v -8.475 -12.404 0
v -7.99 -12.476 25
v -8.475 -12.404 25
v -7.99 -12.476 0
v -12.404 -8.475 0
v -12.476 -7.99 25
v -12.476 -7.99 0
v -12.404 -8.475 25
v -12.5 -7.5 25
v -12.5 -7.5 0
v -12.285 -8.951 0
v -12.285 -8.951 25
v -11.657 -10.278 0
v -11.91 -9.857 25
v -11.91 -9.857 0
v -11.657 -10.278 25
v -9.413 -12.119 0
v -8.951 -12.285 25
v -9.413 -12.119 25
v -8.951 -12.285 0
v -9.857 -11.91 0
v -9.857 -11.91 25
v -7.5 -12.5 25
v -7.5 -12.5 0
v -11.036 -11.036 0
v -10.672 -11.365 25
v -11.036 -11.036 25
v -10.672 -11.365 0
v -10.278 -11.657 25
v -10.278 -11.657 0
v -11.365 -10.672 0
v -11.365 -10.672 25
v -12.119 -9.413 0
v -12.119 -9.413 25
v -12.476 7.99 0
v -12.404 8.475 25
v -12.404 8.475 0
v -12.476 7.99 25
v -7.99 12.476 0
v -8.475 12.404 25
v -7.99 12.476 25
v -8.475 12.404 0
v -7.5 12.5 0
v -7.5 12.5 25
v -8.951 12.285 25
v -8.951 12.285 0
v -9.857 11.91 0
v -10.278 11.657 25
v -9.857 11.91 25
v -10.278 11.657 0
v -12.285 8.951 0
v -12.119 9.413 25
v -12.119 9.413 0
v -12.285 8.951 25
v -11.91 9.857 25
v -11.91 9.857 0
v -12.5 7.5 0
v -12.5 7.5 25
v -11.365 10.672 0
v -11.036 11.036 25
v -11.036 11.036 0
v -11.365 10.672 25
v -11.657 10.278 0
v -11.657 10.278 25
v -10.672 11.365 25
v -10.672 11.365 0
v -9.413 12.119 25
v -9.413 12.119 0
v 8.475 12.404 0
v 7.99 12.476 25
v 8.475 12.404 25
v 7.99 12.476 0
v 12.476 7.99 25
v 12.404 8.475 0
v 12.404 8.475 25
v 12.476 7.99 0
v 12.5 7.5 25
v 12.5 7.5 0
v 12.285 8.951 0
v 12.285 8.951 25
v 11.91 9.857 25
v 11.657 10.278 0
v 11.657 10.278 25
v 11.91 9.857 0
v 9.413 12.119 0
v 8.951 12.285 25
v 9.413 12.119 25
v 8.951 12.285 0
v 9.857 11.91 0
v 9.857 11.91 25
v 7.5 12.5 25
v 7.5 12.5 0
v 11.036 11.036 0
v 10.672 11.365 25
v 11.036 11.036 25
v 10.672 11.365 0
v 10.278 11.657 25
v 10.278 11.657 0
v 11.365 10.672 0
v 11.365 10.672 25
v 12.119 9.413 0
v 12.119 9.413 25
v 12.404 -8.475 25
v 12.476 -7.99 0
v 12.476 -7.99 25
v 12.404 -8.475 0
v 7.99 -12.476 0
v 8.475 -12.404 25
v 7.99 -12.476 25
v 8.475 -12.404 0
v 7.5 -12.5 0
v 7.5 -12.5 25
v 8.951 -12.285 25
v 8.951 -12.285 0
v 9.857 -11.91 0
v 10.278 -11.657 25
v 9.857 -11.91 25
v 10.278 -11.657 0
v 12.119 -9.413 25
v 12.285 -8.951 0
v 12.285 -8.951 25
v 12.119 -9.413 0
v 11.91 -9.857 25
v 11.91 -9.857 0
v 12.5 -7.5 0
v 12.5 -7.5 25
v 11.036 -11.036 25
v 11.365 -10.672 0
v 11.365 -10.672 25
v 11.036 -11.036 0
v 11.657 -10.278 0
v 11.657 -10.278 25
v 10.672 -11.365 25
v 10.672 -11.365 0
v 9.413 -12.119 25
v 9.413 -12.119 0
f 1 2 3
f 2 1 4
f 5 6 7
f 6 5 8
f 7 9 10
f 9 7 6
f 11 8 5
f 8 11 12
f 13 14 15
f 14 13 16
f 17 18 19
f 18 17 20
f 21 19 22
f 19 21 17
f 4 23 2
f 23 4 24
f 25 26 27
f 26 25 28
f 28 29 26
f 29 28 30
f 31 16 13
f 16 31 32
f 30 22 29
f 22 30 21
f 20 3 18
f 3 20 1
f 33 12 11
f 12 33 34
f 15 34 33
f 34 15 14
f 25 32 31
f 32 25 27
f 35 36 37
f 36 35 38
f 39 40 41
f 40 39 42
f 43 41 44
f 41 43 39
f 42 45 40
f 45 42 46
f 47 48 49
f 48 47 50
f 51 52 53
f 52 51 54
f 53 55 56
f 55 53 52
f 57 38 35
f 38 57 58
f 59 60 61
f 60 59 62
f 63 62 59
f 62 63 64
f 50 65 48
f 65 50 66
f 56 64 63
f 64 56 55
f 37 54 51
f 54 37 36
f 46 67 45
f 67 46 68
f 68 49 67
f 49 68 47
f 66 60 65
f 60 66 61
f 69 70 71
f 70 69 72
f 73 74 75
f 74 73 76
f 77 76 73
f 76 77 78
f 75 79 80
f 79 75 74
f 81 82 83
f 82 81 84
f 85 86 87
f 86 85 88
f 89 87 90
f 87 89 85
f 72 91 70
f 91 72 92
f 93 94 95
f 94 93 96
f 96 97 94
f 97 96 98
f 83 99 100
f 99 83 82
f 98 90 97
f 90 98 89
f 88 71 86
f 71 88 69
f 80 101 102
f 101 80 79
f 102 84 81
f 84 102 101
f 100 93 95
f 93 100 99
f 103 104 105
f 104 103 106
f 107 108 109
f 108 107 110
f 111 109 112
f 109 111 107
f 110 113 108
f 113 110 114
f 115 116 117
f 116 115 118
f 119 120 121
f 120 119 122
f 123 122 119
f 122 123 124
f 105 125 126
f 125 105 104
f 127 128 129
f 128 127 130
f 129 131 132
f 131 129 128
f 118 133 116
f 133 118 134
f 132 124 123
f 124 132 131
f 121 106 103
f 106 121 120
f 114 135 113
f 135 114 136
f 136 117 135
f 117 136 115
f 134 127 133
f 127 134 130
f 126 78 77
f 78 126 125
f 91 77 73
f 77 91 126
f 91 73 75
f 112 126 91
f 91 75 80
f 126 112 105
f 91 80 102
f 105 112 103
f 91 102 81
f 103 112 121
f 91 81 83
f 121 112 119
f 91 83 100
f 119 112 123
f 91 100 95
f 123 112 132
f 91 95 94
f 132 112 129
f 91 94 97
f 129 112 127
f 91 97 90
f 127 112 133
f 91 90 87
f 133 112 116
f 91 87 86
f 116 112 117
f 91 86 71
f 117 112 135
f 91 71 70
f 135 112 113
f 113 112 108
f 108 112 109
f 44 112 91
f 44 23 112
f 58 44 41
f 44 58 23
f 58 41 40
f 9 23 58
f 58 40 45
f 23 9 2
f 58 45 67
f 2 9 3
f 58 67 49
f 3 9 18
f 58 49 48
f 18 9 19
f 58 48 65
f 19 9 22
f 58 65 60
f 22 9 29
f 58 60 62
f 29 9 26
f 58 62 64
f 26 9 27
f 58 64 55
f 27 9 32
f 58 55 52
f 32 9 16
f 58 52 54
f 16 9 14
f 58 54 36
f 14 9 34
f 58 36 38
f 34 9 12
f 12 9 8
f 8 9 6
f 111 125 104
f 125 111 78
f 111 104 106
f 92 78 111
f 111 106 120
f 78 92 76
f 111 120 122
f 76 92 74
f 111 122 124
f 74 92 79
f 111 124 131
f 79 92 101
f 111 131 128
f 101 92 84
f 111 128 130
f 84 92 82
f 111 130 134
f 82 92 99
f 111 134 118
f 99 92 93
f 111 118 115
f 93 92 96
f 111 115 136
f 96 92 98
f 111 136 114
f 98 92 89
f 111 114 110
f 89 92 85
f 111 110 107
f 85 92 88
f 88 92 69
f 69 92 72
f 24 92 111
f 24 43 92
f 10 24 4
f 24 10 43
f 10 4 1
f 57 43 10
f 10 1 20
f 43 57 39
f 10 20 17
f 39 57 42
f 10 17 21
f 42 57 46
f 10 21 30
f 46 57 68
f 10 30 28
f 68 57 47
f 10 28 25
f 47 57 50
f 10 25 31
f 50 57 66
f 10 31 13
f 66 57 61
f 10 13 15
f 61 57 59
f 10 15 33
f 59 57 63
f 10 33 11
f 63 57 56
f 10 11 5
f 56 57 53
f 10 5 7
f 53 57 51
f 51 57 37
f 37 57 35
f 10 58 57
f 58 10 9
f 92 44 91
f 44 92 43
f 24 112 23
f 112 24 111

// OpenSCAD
$fn=64;
difference(){translate(v = [-12.500, -12.500])
cube(size = [25, 25, 25]);
translate(v = [-12.500, -12.500])
union(){rotate(a = [0, 0, 180])
translate(v = [-5.000, -5.000])
difference(){translate(v = [0, 0, -0.010])
cube(size = [10.000, 10.000, 25.020]);
translate(v = [0, 0, -0.020])
cylinder(r = 5.000, h = 25.040, $fn = 64);
}
rotate(a = [0, 0, 90])
translate(v = [20.000, -5.000])
difference(){translate(v = [0, 0, -0.010])
cube(size = [10.000, 10.000, 25.020]);
translate(v = [0, 0, -0.020])
cylinder(r = 5.000, h = 25.040, $fn = 64);
}
translate(v = [20.000, 20.000])
difference(){translate(v = [0, 0, -0.010])
cube(size = [10.000, 10.000, 25.020]);
translate(v = [0, 0, -0.020])
cylinder(r = 5.000, h = 25.040, $fn = 64);
}
rotate(a = [0, 0, -90])
translate(v = [-5.000, 20.000])
difference(){translate(v = [0, 0, -0.010])
cube(size = [10.000, 10.000, 25.020]);
translate(v = [0, 0, -0.020])
cylinder(r = 5.000, h = 25.040, $fn = 64);
}
}
}
